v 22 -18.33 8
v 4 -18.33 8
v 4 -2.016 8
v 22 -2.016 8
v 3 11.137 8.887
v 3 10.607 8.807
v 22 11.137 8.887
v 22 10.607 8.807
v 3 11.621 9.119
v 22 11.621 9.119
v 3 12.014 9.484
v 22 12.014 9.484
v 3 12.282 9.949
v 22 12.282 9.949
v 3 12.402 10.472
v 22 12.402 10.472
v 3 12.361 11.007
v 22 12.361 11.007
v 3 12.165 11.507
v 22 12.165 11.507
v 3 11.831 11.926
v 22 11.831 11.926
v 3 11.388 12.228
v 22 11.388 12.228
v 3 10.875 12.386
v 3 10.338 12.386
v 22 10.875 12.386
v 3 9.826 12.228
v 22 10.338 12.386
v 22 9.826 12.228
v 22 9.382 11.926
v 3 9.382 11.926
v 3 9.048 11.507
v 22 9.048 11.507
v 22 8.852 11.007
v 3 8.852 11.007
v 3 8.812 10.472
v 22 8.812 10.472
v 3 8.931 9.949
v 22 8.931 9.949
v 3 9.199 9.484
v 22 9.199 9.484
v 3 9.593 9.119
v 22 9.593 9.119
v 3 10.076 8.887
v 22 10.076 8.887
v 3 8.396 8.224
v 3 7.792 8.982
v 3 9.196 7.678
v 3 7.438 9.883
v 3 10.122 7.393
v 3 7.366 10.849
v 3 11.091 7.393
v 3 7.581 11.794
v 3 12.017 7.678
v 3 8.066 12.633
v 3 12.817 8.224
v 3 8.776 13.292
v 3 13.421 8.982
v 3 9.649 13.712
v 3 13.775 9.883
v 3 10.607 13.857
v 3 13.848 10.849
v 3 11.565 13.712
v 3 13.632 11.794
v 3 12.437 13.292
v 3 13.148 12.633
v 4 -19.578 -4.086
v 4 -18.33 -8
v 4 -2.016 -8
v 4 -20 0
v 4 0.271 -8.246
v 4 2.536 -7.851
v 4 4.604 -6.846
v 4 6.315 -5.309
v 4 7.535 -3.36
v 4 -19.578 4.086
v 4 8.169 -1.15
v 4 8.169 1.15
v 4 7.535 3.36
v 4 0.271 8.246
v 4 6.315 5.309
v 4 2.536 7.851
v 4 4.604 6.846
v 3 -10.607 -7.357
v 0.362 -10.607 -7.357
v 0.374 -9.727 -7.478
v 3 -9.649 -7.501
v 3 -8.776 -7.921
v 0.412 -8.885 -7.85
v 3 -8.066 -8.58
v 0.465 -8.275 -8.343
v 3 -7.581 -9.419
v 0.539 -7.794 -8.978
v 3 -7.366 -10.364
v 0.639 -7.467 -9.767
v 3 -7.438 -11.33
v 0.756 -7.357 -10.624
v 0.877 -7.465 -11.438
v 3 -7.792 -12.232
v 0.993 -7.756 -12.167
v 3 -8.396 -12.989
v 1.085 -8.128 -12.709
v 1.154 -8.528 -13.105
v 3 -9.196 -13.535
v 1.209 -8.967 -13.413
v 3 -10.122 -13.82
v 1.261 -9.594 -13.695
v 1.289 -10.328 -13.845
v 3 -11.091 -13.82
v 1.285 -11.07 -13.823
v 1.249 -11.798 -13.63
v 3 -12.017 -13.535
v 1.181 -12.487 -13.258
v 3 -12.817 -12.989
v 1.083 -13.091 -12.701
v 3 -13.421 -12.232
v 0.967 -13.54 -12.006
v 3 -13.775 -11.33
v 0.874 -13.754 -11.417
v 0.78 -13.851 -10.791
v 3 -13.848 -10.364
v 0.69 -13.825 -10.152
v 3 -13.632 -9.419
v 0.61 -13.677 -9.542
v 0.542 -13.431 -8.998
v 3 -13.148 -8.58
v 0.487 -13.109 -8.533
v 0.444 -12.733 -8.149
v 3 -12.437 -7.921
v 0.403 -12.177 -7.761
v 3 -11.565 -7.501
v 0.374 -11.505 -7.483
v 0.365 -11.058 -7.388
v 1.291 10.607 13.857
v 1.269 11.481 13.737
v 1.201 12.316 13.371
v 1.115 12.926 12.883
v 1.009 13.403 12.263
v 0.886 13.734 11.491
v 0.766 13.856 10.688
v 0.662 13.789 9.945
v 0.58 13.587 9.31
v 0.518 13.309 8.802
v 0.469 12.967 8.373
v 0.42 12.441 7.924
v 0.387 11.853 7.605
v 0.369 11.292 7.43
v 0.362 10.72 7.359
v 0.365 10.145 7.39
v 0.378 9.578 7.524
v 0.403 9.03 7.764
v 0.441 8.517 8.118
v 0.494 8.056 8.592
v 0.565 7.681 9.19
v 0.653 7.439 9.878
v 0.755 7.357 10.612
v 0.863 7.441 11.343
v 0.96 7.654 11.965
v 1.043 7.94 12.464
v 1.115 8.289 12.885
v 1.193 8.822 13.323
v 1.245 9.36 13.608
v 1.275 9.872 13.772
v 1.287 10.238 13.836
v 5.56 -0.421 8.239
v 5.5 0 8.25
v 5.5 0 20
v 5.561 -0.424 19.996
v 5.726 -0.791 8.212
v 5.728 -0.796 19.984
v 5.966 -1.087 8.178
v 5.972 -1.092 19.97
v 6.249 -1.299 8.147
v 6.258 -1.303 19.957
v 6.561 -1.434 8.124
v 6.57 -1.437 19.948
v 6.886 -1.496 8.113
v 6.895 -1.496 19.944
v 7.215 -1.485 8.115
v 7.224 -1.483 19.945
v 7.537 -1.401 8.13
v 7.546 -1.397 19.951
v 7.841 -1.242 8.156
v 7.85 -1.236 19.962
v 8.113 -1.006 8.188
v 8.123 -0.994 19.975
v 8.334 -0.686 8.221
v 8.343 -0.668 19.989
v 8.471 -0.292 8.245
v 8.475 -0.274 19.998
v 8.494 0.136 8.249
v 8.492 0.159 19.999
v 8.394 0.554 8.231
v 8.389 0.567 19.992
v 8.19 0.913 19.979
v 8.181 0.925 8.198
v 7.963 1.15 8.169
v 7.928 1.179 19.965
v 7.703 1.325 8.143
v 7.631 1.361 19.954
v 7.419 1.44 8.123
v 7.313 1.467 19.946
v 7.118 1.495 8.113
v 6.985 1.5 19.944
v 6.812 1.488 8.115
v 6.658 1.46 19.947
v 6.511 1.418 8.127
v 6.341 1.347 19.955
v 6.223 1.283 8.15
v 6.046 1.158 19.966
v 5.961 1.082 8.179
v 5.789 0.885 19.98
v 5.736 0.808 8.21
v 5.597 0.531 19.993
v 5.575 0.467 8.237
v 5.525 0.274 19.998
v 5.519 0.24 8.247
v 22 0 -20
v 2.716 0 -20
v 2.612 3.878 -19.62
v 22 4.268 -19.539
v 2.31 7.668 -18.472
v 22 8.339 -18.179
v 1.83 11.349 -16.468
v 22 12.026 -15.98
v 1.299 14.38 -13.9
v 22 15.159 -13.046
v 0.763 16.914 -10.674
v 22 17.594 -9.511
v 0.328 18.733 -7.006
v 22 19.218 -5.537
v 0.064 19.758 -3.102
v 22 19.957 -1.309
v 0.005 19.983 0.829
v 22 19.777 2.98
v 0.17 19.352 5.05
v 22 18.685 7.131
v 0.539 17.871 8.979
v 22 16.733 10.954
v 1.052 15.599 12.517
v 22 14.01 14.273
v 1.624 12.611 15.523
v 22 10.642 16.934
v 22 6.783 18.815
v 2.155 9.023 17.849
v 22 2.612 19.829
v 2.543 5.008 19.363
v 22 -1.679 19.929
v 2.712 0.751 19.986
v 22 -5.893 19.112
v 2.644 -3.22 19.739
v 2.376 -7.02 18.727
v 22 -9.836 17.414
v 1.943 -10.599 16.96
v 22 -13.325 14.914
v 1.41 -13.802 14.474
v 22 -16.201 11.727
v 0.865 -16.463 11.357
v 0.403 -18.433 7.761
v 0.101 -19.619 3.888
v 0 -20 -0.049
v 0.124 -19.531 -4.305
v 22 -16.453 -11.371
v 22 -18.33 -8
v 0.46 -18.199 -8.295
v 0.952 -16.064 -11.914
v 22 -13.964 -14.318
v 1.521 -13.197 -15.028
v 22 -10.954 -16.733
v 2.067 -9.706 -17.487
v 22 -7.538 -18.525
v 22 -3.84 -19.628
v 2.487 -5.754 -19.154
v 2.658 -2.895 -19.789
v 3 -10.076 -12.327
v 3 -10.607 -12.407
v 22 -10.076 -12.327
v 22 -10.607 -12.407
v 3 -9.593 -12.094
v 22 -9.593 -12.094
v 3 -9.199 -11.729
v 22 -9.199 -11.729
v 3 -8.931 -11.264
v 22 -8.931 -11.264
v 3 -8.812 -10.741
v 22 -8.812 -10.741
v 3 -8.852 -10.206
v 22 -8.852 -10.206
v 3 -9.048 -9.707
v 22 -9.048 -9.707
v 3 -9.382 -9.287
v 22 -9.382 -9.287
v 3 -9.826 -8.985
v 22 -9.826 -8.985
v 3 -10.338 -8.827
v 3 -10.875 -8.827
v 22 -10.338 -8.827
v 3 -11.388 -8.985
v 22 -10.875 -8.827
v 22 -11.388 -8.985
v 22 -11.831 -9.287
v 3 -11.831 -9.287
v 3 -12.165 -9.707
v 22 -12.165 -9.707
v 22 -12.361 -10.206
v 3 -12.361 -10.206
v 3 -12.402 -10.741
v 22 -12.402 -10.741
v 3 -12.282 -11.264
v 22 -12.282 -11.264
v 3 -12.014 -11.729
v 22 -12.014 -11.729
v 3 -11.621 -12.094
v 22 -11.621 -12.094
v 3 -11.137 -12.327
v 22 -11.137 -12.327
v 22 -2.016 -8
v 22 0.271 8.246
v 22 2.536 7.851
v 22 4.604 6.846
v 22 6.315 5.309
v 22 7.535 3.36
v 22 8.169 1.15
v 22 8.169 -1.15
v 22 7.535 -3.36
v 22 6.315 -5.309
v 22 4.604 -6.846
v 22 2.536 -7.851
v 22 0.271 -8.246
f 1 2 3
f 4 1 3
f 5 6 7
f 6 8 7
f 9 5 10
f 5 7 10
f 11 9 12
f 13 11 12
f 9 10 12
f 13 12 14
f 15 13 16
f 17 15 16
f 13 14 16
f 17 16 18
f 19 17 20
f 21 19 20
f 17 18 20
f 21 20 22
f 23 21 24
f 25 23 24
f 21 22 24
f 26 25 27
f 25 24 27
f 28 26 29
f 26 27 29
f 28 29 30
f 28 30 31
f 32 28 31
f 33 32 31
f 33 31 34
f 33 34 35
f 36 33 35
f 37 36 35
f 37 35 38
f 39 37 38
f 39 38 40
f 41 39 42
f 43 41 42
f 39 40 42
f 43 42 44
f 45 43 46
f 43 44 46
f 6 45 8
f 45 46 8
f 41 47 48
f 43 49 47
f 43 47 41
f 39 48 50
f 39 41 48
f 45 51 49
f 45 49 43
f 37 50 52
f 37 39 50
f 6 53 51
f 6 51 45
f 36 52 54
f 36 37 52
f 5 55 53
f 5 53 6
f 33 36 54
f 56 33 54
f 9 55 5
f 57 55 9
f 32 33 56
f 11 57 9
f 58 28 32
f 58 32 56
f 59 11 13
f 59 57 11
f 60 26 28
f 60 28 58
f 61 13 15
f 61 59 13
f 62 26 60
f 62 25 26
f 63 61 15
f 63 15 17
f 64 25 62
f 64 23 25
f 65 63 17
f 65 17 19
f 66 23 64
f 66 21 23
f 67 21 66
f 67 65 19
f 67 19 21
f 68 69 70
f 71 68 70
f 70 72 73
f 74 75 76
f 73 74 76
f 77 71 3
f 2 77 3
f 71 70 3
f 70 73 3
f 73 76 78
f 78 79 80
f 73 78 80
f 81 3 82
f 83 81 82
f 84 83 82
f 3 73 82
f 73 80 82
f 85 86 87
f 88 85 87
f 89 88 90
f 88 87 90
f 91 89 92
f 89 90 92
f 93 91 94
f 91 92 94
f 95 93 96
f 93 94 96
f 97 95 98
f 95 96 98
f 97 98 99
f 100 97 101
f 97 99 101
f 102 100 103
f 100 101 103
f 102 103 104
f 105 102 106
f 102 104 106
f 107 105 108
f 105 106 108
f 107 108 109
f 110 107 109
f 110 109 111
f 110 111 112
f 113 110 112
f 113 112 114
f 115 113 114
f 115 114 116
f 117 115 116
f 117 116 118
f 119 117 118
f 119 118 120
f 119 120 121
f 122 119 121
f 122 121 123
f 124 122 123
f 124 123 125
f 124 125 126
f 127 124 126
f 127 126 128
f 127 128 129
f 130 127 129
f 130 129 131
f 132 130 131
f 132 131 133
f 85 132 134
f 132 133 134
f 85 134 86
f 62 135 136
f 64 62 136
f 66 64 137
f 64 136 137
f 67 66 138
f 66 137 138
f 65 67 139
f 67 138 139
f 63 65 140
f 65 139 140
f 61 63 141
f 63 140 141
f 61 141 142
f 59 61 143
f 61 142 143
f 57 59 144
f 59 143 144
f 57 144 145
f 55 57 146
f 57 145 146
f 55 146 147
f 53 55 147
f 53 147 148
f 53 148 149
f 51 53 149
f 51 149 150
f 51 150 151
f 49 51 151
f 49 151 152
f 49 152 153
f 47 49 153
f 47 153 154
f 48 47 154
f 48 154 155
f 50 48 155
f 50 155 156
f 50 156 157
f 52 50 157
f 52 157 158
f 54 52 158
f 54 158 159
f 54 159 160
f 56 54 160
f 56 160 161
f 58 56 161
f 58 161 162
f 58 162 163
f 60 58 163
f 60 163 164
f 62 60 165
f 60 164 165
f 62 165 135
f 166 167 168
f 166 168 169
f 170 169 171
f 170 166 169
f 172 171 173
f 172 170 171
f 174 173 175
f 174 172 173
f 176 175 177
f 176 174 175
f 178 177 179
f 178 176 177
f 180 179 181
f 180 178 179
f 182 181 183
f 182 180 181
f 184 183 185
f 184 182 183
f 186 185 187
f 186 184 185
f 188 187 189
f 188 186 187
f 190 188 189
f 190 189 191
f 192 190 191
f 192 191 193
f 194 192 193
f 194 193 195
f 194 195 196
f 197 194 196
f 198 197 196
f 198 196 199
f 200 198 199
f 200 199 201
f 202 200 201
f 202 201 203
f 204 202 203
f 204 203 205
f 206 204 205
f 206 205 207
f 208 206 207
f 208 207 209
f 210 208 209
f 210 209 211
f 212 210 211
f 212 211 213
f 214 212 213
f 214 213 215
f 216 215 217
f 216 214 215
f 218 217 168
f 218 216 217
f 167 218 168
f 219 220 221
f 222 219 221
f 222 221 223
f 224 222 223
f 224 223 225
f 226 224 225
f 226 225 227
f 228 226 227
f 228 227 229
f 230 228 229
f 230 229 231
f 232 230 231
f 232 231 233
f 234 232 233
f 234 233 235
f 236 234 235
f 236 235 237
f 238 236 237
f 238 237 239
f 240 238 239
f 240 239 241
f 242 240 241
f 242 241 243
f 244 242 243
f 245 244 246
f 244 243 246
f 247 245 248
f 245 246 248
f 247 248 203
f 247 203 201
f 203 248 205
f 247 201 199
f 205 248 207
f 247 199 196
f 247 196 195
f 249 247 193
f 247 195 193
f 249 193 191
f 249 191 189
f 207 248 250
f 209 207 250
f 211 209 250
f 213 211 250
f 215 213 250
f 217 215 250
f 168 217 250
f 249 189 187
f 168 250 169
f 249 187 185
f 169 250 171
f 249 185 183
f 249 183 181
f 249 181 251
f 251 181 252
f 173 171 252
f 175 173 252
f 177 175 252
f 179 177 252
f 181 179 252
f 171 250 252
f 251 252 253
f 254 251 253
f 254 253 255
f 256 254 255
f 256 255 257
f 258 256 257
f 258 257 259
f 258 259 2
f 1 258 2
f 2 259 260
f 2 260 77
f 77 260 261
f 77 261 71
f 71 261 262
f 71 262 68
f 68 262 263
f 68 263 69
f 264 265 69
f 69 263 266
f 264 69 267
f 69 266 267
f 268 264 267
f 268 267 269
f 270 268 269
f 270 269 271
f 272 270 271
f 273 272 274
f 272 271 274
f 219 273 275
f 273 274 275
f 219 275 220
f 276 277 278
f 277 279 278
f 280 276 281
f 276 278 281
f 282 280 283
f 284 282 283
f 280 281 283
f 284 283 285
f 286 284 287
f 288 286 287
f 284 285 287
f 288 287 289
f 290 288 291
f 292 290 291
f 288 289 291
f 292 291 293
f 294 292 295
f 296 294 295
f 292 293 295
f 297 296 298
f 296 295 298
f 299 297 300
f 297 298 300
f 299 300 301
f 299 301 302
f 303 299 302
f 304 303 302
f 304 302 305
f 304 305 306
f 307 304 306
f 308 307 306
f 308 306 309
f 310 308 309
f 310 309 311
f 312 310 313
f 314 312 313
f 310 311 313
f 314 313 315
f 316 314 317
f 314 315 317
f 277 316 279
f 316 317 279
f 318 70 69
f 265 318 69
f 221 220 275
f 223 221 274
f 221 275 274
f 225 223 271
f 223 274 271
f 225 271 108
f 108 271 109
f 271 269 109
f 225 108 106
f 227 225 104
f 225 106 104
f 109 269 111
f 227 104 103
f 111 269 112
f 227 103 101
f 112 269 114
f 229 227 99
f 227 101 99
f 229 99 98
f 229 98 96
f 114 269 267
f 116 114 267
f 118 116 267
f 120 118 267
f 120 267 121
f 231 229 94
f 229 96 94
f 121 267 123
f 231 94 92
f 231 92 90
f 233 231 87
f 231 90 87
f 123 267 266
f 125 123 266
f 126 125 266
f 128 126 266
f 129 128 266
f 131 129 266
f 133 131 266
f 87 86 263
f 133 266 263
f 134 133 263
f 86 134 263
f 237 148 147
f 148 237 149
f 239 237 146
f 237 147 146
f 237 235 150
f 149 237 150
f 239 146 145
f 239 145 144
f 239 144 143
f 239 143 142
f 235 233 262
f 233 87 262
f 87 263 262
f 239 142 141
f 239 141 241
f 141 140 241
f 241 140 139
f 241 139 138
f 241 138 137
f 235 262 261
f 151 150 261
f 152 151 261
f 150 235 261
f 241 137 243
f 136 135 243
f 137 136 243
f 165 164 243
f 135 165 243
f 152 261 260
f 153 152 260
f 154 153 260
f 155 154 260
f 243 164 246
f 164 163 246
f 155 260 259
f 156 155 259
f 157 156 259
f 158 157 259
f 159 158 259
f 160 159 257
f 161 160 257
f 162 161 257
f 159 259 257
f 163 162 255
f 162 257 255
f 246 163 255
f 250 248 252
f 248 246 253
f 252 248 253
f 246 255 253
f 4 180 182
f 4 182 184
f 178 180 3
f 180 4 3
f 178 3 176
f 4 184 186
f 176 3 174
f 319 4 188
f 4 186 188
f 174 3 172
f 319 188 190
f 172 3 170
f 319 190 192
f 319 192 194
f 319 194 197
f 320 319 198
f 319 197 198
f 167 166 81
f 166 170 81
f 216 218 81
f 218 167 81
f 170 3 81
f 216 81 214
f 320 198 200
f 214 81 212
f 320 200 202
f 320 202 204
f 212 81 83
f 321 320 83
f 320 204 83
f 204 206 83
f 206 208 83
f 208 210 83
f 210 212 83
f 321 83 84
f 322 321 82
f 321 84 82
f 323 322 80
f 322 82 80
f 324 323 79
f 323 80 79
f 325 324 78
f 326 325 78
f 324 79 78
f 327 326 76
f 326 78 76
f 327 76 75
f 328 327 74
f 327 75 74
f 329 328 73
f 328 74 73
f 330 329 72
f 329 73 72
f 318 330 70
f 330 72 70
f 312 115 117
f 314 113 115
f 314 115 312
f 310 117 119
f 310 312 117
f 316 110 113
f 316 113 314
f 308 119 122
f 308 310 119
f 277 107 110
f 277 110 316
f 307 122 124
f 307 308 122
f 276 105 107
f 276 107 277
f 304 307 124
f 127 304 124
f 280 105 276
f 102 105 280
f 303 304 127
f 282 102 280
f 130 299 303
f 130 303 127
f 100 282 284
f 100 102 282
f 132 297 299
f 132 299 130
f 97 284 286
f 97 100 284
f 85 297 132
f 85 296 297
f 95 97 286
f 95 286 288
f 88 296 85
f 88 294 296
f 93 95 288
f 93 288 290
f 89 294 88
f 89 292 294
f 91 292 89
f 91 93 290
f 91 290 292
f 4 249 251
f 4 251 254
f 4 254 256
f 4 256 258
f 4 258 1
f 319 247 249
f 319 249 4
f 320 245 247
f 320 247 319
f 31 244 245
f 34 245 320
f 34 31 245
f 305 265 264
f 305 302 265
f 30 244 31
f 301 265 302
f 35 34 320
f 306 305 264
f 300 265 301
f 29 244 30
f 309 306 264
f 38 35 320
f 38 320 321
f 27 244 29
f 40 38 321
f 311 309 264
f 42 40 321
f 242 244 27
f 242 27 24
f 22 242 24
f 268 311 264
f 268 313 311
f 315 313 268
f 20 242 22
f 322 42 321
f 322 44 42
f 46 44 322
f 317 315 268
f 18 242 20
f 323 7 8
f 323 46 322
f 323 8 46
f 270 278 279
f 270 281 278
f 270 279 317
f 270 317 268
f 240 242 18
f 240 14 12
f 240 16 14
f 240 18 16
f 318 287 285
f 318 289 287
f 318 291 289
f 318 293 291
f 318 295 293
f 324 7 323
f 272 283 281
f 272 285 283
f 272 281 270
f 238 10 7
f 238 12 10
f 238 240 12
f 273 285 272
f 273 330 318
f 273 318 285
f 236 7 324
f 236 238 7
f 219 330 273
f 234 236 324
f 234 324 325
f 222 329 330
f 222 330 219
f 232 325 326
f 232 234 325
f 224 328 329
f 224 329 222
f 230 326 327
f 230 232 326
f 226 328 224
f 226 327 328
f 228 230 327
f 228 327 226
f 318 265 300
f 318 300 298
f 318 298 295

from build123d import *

# Parameters (mm, degrees)
SKETCH1_R                               = 20
BLOCO_DEPTH                             = 22
ENCAIXE_START                           = -18
ENCAIXE_DO_POTENCI_METRO_DEPTH          = 18
FURO_DE_FIXA_O_PARAFUSO_M3_D            = 3.6
FURO_DE_FIXA_O_PARAFUSO_M3_CBORE_D      = 6.5
FURO_DE_FIXA_O_PARAFUSO_M3_CBORE_DEPTH  = 3
CORTE_ARREDONDAMENTO_DEPTH              = 36.832945734
CORTE_ARREDONDAMENTO_DEPTH_BACK         = 36.832945734
SKETCH7_R                               = 100
SKETCH7_R_2                             = 75
FURO_DE_FIXA_O_POTENCI_METRO_REACH      = 37.833
FURO_DE_FIXA_O_POTENCI_METRO_END_RADIUS = 20
SKETCH8_R                               = 1.5


with BuildPart() as part:
    # Sketch1 → Bloco (new body)
    with BuildSketch(Plane(origin=(0, 0, 0), x_dir=(0, 0, -1), z_dir=(1, 0, 0))):
        Circle(SKETCH1_R)
    extrude(amount=BLOCO_DEPTH)

    # Sketch2 → Encaixe do Potenciômetro (cut)
    with BuildSketch(Plane(origin=(22, 0, 0), x_dir=(0, 0, -1), z_dir=(1, 0, 0)).offset(ENCAIXE_START)):
        with BuildLine():
            Line((-8, -18.33030278), (-8, -2.015564437))
            ThreePointArc((-8, -2.015564437), (0, 8.25), (8, -2.015564437))
            Line((8, -2.015564437), (8, -18.33030278))
            ThreePointArc((8, -18.33030278), (0, -20), (-8, -18.33030278))
        make_face()
    extrude(amount=ENCAIXE_DO_POTENCI_METRO_DEPTH, mode=Mode.SUBTRACT)

    # Furo de Fixação - Parafuso M3 (through all)
    with Locations(Plane.ZY):
        with Locations((10.606601718, 10.606601718), (-10.606601718, -10.606601718)):
            CounterBoreHole(FURO_DE_FIXA_O_PARAFUSO_M3_D / 2, FURO_DE_FIXA_O_PARAFUSO_M3_CBORE_D / 2, FURO_DE_FIXA_O_PARAFUSO_M3_CBORE_DEPTH)

    # Sketch7 → Corte - Arredondamento (cut, two sides: drawn at the far end of the back side and taken through both)
    with BuildSketch(Plane(origin=(0, 0, 0), x_dir=(1, 0, 0), z_dir=(0, 1, 0)).offset(-CORTE_ARREDONDAMENTO_DEPTH_BACK)):
        with Locations((75, 0)):
            Circle(SKETCH7_R)
        with Locations((75, 0)):
            Circle(SKETCH7_R_2, mode=Mode.SUBTRACT)
    extrude(amount=CORTE_ARREDONDAMENTO_DEPTH + CORTE_ARREDONDAMENTO_DEPTH_BACK, mode=Mode.SUBTRACT)

    # Furo de Fixação - Potenciômetro: up to this cylinder (the profile starts inside it)
    furo_de_fixa_o_potenci_metro_end = Plane(origin=(7, 0, 0), z_dir=(-1, 0, 0)) * Cylinder(FURO_DE_FIXA_O_POTENCI_METRO_END_RADIUS, 116.666, mode=Mode.PRIVATE)
    # Sketch8 → Furo de Fixação - Potenciômetro (cut, up to the surface)
    with BuildSketch(Plane.XY, mode=Mode.PRIVATE) as furo_de_fixa_o_potenci_metro_sk1:
        with Locations(Location((7, 0, 0), (0, 0, 180))):
            Circle(SKETCH8_R)
    furo_de_fixa_o_potenci_metro_tool1 = extrude(furo_de_fixa_o_potenci_metro_sk1.sketch, amount=FURO_DE_FIXA_O_POTENCI_METRO_REACH, mode=Mode.PRIVATE) & furo_de_fixa_o_potenci_metro_end
    add(furo_de_fixa_o_potenci_metro_tool1.solids().sort_by_distance((7, 0, 0))[0], mode=Mode.SUBTRACT)


solid = part.part
